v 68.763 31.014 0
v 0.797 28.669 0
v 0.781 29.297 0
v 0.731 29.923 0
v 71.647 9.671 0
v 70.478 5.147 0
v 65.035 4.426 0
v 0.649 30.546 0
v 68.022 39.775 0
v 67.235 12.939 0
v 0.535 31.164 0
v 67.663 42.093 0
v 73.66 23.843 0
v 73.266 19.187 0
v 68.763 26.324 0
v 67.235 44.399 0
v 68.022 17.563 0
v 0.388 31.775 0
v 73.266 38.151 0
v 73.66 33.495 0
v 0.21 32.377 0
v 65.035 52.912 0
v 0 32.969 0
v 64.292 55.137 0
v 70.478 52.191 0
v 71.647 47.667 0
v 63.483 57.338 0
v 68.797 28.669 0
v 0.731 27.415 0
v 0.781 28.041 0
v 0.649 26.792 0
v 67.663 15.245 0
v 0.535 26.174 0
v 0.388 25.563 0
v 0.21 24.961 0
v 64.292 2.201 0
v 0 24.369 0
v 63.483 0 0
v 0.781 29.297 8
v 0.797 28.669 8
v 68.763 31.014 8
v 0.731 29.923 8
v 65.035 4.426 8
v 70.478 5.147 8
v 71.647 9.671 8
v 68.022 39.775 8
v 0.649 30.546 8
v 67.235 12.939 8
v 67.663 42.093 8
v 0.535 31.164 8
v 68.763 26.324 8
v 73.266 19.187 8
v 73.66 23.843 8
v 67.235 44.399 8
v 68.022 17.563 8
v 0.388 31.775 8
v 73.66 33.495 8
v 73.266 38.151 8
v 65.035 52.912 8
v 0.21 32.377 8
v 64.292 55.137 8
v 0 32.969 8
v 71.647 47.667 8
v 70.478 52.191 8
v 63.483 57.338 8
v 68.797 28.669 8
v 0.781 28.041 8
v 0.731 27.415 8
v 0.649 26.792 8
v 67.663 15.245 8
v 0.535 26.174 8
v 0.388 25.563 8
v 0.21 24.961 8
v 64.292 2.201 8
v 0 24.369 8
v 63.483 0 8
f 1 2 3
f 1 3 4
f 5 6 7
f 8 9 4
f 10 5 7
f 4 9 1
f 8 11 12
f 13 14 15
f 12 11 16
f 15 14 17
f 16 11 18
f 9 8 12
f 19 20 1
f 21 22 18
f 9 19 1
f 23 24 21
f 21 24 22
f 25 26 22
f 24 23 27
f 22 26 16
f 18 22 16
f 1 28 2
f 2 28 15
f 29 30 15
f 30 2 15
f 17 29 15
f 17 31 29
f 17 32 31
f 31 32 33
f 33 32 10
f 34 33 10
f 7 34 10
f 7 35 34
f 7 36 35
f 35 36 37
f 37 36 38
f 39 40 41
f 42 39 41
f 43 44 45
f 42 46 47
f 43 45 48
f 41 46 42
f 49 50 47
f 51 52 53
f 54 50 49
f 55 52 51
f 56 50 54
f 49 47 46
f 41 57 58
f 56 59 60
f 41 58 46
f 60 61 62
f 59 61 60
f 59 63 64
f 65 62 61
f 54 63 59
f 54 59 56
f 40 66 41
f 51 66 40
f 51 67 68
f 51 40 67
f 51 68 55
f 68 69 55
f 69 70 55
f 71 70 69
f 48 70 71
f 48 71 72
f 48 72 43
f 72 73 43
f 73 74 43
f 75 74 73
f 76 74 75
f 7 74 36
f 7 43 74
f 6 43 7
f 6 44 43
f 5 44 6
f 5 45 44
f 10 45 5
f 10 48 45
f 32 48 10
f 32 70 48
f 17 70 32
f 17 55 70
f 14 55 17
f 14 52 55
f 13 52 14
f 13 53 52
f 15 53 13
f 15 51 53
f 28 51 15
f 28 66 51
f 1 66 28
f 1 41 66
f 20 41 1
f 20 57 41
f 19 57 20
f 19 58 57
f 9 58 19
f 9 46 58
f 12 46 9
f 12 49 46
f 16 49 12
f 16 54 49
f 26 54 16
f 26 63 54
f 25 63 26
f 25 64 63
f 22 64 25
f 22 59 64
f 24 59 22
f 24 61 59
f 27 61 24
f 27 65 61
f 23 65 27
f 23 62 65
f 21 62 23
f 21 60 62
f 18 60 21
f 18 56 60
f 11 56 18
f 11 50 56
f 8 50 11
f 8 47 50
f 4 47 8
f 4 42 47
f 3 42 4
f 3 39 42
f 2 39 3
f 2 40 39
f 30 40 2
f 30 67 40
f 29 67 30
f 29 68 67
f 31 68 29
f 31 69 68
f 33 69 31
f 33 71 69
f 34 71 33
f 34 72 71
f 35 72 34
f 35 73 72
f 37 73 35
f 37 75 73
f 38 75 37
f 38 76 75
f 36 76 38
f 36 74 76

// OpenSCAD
$fn = 32;

// ----------------------------------------------------------------------
// Gear sector: 4 teeth on 42 degrees
// ----------------------------------------------------------------------

// --- parameters (mm) ---
sector_angle = 42;        // sector angle, degrees
root_r = 80;              // root circle radius
tooth_h = 5;              // tooth height over the root circle
teeth = 4;                // number of teeth on the sector
hub_r = 12;               // hub bore radius
plate_t = 8;              // sector thickness, Z
arc_step = 3;             // sampling step of the root/hub arcs, degrees

tip_r = root_r + tooth_h;  // tip circle radius

profile = [[63.483, 0], [64.292, 2.201], [65.035, 4.426], [70.478, 5.147], [71.647, 9.671], [67.235, 12.939], [67.663, 15.245], [68.022, 17.563], [73.266, 19.187], [73.66, 23.843], [68.763, 26.324], [68.797, 28.669], [68.763, 31.014], [73.66, 33.495], [73.266, 38.151], [68.022, 39.775], [67.663, 42.093], [67.235, 44.399], [71.647, 47.667], [70.478, 52.191], [65.035, 52.912], [64.292, 55.137], [63.483, 57.338], [0, 32.969], [0.21, 32.377], [0.388, 31.775], [0.535, 31.164], [0.649, 30.546], [0.731, 29.923], [0.781, 29.297], [0.797, 28.669], [0.781, 28.041], [0.731, 27.415], [0.649, 26.792], [0.535, 26.174], [0.388, 25.563], [0.21, 24.961], [0, 24.369]];  // primary outline, 38 points, counter clockwise

// --- the one profile operation ---
linear_extrude(height = plate_t) polygon(points = profile);
